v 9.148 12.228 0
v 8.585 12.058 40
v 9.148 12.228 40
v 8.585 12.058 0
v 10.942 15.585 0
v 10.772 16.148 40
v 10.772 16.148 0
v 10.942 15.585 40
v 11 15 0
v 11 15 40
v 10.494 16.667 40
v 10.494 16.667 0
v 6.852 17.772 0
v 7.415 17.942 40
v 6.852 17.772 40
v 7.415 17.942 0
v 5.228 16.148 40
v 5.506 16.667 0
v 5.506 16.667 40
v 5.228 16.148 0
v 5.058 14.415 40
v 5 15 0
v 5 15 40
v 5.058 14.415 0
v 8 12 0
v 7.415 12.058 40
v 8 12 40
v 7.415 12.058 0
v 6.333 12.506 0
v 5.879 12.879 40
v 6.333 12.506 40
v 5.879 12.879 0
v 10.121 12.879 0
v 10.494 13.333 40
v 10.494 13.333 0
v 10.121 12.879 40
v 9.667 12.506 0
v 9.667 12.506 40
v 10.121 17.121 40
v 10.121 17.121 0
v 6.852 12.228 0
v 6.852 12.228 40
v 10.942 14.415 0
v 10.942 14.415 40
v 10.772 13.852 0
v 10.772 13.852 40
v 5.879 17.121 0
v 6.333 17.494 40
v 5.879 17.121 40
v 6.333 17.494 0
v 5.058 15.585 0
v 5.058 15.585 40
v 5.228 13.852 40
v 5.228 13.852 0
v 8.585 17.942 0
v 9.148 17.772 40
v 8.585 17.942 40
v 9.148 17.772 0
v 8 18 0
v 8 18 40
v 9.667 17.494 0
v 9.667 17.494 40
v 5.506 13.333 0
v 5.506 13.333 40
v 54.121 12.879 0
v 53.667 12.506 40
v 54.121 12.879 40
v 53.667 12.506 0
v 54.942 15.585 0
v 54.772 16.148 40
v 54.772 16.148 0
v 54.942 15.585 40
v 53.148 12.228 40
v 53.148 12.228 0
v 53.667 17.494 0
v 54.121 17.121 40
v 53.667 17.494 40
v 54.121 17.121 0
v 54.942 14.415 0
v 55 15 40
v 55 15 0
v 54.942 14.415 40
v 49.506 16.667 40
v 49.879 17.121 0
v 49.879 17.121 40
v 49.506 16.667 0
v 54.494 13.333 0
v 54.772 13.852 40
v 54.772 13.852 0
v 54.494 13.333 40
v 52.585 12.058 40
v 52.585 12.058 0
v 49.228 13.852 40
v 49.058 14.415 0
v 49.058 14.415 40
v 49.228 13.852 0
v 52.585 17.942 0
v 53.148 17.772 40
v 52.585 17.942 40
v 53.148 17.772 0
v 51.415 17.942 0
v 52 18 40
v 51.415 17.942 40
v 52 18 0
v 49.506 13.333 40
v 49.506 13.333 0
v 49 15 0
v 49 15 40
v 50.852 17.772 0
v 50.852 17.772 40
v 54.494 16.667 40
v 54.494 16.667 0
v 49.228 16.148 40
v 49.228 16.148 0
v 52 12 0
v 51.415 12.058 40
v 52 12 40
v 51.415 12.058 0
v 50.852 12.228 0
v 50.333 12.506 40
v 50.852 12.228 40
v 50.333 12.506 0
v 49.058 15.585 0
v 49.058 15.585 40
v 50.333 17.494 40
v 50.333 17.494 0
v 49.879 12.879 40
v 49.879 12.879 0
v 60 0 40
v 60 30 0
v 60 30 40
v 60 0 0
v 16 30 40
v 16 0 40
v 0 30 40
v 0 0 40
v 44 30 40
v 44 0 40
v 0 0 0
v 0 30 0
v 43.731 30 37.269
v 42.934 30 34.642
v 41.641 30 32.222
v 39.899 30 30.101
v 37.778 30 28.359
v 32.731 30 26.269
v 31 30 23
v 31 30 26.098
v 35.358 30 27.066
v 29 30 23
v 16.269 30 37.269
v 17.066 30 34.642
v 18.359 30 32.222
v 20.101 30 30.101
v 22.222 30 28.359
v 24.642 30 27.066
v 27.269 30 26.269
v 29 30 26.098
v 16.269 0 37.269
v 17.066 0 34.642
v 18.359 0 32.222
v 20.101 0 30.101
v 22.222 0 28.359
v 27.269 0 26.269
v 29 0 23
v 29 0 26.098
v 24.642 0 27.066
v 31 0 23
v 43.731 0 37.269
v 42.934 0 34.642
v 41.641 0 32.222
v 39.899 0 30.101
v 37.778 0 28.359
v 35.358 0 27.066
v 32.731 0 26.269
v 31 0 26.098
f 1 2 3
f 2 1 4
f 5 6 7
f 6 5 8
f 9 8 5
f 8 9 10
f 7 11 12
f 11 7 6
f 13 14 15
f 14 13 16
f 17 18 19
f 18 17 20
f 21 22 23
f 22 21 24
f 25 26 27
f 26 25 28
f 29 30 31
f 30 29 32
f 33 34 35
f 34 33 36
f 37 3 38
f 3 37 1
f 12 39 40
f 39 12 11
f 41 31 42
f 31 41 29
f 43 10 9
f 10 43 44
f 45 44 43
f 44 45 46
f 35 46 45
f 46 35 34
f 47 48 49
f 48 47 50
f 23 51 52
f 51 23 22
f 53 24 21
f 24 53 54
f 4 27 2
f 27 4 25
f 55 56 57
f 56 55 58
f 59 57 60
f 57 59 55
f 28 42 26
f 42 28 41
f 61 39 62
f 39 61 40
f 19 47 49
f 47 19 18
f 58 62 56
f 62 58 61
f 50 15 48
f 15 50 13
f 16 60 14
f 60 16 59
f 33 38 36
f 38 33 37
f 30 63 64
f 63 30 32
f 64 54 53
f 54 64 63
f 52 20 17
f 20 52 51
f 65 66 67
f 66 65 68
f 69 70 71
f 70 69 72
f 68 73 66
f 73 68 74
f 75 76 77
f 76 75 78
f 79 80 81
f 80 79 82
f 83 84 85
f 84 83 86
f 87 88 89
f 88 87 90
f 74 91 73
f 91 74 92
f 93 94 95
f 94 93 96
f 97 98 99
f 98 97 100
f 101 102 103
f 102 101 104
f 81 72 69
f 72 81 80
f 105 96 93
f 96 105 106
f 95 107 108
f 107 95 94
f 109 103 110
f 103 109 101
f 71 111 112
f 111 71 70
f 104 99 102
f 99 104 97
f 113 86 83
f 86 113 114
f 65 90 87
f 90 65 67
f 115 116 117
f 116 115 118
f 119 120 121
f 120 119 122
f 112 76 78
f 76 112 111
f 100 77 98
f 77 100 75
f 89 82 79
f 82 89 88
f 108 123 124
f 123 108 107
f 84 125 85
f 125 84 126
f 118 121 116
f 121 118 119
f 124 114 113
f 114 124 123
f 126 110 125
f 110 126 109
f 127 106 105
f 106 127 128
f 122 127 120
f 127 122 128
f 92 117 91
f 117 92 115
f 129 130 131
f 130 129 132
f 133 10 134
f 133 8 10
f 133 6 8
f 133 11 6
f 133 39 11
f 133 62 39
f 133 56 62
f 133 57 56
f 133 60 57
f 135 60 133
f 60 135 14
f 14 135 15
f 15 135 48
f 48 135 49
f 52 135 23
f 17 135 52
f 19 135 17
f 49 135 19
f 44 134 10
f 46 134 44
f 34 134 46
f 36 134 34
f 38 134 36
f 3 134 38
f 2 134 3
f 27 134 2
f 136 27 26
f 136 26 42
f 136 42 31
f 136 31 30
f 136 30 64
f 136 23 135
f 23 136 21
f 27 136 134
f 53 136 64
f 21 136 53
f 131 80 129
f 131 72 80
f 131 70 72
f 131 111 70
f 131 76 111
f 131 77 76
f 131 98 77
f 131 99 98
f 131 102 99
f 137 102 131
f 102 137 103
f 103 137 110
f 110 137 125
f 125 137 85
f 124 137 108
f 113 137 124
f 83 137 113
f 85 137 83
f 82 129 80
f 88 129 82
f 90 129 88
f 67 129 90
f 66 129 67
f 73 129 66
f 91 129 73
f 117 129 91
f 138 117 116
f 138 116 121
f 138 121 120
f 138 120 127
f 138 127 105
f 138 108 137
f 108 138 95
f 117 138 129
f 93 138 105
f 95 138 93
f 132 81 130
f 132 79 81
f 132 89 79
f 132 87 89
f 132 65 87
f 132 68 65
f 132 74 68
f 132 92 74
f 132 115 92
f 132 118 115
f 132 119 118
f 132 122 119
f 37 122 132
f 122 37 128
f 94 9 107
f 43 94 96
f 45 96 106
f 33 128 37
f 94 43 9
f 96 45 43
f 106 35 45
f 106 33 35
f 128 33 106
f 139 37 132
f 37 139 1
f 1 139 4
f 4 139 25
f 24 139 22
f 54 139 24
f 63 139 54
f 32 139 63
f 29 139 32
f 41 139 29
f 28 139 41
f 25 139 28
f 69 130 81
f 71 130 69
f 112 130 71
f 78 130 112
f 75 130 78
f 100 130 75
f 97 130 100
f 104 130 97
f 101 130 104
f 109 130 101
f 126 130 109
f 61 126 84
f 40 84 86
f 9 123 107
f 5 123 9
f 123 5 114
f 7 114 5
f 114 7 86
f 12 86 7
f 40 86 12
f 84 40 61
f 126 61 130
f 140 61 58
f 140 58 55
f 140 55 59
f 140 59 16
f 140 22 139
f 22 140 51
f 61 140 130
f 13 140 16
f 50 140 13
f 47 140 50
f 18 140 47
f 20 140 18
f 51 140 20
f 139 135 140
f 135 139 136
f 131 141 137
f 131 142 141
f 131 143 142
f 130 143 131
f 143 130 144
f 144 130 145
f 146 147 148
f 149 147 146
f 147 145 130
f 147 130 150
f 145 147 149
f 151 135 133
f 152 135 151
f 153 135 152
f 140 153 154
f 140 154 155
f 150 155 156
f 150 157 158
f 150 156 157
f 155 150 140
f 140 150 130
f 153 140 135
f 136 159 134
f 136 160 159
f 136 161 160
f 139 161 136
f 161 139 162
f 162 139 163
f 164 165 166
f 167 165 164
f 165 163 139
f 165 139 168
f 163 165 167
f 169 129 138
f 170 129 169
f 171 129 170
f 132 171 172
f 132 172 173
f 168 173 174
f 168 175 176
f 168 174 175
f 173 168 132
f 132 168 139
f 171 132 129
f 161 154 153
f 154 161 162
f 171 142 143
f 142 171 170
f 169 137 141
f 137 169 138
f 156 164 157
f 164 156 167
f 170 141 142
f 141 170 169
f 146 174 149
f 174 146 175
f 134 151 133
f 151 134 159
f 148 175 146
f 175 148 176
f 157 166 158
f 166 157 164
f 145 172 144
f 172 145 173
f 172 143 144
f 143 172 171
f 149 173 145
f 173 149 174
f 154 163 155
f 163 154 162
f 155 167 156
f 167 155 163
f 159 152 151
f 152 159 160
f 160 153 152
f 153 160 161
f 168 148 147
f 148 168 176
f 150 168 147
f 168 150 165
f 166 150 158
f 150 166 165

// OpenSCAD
$fn = 32;

// ----------------------------------------------------------------------
// Saddle clamp: split shaft clamp
// ----------------------------------------------------------------------

// --- parameters (mm) ---
blk_l = 60;               // block length, X
blk_w = 30;               // block width, Y
blk_h = 40;               // block height
clamp_r = 14;             // shaft groove radius
hole_r = 3;               // bolt hole radius
hole_m = 8;               // bolt hole margin from the ends
saw_w = 2;                // saw kerf width

saw_depth = clamp_r + 3;  // saw kerf depth

difference() {
  cube([blk_l, blk_w, blk_h]);
  translate([blk_l / 2, -1, blk_h])
    rotate([-90, 0, 0])
      cylinder(h = blk_w + 2, r = clamp_r);
  for (sx = [0, 1])
    translate([sx ? blk_l - hole_m : hole_m, blk_w / 2, -1])
      cylinder(r = hole_r, h = blk_h + 2);
  translate([blk_l / 2 - saw_w / 2, -1, blk_h - saw_depth])
    cube([saw_w, blk_w + 2, saw_depth + 1]);
}
